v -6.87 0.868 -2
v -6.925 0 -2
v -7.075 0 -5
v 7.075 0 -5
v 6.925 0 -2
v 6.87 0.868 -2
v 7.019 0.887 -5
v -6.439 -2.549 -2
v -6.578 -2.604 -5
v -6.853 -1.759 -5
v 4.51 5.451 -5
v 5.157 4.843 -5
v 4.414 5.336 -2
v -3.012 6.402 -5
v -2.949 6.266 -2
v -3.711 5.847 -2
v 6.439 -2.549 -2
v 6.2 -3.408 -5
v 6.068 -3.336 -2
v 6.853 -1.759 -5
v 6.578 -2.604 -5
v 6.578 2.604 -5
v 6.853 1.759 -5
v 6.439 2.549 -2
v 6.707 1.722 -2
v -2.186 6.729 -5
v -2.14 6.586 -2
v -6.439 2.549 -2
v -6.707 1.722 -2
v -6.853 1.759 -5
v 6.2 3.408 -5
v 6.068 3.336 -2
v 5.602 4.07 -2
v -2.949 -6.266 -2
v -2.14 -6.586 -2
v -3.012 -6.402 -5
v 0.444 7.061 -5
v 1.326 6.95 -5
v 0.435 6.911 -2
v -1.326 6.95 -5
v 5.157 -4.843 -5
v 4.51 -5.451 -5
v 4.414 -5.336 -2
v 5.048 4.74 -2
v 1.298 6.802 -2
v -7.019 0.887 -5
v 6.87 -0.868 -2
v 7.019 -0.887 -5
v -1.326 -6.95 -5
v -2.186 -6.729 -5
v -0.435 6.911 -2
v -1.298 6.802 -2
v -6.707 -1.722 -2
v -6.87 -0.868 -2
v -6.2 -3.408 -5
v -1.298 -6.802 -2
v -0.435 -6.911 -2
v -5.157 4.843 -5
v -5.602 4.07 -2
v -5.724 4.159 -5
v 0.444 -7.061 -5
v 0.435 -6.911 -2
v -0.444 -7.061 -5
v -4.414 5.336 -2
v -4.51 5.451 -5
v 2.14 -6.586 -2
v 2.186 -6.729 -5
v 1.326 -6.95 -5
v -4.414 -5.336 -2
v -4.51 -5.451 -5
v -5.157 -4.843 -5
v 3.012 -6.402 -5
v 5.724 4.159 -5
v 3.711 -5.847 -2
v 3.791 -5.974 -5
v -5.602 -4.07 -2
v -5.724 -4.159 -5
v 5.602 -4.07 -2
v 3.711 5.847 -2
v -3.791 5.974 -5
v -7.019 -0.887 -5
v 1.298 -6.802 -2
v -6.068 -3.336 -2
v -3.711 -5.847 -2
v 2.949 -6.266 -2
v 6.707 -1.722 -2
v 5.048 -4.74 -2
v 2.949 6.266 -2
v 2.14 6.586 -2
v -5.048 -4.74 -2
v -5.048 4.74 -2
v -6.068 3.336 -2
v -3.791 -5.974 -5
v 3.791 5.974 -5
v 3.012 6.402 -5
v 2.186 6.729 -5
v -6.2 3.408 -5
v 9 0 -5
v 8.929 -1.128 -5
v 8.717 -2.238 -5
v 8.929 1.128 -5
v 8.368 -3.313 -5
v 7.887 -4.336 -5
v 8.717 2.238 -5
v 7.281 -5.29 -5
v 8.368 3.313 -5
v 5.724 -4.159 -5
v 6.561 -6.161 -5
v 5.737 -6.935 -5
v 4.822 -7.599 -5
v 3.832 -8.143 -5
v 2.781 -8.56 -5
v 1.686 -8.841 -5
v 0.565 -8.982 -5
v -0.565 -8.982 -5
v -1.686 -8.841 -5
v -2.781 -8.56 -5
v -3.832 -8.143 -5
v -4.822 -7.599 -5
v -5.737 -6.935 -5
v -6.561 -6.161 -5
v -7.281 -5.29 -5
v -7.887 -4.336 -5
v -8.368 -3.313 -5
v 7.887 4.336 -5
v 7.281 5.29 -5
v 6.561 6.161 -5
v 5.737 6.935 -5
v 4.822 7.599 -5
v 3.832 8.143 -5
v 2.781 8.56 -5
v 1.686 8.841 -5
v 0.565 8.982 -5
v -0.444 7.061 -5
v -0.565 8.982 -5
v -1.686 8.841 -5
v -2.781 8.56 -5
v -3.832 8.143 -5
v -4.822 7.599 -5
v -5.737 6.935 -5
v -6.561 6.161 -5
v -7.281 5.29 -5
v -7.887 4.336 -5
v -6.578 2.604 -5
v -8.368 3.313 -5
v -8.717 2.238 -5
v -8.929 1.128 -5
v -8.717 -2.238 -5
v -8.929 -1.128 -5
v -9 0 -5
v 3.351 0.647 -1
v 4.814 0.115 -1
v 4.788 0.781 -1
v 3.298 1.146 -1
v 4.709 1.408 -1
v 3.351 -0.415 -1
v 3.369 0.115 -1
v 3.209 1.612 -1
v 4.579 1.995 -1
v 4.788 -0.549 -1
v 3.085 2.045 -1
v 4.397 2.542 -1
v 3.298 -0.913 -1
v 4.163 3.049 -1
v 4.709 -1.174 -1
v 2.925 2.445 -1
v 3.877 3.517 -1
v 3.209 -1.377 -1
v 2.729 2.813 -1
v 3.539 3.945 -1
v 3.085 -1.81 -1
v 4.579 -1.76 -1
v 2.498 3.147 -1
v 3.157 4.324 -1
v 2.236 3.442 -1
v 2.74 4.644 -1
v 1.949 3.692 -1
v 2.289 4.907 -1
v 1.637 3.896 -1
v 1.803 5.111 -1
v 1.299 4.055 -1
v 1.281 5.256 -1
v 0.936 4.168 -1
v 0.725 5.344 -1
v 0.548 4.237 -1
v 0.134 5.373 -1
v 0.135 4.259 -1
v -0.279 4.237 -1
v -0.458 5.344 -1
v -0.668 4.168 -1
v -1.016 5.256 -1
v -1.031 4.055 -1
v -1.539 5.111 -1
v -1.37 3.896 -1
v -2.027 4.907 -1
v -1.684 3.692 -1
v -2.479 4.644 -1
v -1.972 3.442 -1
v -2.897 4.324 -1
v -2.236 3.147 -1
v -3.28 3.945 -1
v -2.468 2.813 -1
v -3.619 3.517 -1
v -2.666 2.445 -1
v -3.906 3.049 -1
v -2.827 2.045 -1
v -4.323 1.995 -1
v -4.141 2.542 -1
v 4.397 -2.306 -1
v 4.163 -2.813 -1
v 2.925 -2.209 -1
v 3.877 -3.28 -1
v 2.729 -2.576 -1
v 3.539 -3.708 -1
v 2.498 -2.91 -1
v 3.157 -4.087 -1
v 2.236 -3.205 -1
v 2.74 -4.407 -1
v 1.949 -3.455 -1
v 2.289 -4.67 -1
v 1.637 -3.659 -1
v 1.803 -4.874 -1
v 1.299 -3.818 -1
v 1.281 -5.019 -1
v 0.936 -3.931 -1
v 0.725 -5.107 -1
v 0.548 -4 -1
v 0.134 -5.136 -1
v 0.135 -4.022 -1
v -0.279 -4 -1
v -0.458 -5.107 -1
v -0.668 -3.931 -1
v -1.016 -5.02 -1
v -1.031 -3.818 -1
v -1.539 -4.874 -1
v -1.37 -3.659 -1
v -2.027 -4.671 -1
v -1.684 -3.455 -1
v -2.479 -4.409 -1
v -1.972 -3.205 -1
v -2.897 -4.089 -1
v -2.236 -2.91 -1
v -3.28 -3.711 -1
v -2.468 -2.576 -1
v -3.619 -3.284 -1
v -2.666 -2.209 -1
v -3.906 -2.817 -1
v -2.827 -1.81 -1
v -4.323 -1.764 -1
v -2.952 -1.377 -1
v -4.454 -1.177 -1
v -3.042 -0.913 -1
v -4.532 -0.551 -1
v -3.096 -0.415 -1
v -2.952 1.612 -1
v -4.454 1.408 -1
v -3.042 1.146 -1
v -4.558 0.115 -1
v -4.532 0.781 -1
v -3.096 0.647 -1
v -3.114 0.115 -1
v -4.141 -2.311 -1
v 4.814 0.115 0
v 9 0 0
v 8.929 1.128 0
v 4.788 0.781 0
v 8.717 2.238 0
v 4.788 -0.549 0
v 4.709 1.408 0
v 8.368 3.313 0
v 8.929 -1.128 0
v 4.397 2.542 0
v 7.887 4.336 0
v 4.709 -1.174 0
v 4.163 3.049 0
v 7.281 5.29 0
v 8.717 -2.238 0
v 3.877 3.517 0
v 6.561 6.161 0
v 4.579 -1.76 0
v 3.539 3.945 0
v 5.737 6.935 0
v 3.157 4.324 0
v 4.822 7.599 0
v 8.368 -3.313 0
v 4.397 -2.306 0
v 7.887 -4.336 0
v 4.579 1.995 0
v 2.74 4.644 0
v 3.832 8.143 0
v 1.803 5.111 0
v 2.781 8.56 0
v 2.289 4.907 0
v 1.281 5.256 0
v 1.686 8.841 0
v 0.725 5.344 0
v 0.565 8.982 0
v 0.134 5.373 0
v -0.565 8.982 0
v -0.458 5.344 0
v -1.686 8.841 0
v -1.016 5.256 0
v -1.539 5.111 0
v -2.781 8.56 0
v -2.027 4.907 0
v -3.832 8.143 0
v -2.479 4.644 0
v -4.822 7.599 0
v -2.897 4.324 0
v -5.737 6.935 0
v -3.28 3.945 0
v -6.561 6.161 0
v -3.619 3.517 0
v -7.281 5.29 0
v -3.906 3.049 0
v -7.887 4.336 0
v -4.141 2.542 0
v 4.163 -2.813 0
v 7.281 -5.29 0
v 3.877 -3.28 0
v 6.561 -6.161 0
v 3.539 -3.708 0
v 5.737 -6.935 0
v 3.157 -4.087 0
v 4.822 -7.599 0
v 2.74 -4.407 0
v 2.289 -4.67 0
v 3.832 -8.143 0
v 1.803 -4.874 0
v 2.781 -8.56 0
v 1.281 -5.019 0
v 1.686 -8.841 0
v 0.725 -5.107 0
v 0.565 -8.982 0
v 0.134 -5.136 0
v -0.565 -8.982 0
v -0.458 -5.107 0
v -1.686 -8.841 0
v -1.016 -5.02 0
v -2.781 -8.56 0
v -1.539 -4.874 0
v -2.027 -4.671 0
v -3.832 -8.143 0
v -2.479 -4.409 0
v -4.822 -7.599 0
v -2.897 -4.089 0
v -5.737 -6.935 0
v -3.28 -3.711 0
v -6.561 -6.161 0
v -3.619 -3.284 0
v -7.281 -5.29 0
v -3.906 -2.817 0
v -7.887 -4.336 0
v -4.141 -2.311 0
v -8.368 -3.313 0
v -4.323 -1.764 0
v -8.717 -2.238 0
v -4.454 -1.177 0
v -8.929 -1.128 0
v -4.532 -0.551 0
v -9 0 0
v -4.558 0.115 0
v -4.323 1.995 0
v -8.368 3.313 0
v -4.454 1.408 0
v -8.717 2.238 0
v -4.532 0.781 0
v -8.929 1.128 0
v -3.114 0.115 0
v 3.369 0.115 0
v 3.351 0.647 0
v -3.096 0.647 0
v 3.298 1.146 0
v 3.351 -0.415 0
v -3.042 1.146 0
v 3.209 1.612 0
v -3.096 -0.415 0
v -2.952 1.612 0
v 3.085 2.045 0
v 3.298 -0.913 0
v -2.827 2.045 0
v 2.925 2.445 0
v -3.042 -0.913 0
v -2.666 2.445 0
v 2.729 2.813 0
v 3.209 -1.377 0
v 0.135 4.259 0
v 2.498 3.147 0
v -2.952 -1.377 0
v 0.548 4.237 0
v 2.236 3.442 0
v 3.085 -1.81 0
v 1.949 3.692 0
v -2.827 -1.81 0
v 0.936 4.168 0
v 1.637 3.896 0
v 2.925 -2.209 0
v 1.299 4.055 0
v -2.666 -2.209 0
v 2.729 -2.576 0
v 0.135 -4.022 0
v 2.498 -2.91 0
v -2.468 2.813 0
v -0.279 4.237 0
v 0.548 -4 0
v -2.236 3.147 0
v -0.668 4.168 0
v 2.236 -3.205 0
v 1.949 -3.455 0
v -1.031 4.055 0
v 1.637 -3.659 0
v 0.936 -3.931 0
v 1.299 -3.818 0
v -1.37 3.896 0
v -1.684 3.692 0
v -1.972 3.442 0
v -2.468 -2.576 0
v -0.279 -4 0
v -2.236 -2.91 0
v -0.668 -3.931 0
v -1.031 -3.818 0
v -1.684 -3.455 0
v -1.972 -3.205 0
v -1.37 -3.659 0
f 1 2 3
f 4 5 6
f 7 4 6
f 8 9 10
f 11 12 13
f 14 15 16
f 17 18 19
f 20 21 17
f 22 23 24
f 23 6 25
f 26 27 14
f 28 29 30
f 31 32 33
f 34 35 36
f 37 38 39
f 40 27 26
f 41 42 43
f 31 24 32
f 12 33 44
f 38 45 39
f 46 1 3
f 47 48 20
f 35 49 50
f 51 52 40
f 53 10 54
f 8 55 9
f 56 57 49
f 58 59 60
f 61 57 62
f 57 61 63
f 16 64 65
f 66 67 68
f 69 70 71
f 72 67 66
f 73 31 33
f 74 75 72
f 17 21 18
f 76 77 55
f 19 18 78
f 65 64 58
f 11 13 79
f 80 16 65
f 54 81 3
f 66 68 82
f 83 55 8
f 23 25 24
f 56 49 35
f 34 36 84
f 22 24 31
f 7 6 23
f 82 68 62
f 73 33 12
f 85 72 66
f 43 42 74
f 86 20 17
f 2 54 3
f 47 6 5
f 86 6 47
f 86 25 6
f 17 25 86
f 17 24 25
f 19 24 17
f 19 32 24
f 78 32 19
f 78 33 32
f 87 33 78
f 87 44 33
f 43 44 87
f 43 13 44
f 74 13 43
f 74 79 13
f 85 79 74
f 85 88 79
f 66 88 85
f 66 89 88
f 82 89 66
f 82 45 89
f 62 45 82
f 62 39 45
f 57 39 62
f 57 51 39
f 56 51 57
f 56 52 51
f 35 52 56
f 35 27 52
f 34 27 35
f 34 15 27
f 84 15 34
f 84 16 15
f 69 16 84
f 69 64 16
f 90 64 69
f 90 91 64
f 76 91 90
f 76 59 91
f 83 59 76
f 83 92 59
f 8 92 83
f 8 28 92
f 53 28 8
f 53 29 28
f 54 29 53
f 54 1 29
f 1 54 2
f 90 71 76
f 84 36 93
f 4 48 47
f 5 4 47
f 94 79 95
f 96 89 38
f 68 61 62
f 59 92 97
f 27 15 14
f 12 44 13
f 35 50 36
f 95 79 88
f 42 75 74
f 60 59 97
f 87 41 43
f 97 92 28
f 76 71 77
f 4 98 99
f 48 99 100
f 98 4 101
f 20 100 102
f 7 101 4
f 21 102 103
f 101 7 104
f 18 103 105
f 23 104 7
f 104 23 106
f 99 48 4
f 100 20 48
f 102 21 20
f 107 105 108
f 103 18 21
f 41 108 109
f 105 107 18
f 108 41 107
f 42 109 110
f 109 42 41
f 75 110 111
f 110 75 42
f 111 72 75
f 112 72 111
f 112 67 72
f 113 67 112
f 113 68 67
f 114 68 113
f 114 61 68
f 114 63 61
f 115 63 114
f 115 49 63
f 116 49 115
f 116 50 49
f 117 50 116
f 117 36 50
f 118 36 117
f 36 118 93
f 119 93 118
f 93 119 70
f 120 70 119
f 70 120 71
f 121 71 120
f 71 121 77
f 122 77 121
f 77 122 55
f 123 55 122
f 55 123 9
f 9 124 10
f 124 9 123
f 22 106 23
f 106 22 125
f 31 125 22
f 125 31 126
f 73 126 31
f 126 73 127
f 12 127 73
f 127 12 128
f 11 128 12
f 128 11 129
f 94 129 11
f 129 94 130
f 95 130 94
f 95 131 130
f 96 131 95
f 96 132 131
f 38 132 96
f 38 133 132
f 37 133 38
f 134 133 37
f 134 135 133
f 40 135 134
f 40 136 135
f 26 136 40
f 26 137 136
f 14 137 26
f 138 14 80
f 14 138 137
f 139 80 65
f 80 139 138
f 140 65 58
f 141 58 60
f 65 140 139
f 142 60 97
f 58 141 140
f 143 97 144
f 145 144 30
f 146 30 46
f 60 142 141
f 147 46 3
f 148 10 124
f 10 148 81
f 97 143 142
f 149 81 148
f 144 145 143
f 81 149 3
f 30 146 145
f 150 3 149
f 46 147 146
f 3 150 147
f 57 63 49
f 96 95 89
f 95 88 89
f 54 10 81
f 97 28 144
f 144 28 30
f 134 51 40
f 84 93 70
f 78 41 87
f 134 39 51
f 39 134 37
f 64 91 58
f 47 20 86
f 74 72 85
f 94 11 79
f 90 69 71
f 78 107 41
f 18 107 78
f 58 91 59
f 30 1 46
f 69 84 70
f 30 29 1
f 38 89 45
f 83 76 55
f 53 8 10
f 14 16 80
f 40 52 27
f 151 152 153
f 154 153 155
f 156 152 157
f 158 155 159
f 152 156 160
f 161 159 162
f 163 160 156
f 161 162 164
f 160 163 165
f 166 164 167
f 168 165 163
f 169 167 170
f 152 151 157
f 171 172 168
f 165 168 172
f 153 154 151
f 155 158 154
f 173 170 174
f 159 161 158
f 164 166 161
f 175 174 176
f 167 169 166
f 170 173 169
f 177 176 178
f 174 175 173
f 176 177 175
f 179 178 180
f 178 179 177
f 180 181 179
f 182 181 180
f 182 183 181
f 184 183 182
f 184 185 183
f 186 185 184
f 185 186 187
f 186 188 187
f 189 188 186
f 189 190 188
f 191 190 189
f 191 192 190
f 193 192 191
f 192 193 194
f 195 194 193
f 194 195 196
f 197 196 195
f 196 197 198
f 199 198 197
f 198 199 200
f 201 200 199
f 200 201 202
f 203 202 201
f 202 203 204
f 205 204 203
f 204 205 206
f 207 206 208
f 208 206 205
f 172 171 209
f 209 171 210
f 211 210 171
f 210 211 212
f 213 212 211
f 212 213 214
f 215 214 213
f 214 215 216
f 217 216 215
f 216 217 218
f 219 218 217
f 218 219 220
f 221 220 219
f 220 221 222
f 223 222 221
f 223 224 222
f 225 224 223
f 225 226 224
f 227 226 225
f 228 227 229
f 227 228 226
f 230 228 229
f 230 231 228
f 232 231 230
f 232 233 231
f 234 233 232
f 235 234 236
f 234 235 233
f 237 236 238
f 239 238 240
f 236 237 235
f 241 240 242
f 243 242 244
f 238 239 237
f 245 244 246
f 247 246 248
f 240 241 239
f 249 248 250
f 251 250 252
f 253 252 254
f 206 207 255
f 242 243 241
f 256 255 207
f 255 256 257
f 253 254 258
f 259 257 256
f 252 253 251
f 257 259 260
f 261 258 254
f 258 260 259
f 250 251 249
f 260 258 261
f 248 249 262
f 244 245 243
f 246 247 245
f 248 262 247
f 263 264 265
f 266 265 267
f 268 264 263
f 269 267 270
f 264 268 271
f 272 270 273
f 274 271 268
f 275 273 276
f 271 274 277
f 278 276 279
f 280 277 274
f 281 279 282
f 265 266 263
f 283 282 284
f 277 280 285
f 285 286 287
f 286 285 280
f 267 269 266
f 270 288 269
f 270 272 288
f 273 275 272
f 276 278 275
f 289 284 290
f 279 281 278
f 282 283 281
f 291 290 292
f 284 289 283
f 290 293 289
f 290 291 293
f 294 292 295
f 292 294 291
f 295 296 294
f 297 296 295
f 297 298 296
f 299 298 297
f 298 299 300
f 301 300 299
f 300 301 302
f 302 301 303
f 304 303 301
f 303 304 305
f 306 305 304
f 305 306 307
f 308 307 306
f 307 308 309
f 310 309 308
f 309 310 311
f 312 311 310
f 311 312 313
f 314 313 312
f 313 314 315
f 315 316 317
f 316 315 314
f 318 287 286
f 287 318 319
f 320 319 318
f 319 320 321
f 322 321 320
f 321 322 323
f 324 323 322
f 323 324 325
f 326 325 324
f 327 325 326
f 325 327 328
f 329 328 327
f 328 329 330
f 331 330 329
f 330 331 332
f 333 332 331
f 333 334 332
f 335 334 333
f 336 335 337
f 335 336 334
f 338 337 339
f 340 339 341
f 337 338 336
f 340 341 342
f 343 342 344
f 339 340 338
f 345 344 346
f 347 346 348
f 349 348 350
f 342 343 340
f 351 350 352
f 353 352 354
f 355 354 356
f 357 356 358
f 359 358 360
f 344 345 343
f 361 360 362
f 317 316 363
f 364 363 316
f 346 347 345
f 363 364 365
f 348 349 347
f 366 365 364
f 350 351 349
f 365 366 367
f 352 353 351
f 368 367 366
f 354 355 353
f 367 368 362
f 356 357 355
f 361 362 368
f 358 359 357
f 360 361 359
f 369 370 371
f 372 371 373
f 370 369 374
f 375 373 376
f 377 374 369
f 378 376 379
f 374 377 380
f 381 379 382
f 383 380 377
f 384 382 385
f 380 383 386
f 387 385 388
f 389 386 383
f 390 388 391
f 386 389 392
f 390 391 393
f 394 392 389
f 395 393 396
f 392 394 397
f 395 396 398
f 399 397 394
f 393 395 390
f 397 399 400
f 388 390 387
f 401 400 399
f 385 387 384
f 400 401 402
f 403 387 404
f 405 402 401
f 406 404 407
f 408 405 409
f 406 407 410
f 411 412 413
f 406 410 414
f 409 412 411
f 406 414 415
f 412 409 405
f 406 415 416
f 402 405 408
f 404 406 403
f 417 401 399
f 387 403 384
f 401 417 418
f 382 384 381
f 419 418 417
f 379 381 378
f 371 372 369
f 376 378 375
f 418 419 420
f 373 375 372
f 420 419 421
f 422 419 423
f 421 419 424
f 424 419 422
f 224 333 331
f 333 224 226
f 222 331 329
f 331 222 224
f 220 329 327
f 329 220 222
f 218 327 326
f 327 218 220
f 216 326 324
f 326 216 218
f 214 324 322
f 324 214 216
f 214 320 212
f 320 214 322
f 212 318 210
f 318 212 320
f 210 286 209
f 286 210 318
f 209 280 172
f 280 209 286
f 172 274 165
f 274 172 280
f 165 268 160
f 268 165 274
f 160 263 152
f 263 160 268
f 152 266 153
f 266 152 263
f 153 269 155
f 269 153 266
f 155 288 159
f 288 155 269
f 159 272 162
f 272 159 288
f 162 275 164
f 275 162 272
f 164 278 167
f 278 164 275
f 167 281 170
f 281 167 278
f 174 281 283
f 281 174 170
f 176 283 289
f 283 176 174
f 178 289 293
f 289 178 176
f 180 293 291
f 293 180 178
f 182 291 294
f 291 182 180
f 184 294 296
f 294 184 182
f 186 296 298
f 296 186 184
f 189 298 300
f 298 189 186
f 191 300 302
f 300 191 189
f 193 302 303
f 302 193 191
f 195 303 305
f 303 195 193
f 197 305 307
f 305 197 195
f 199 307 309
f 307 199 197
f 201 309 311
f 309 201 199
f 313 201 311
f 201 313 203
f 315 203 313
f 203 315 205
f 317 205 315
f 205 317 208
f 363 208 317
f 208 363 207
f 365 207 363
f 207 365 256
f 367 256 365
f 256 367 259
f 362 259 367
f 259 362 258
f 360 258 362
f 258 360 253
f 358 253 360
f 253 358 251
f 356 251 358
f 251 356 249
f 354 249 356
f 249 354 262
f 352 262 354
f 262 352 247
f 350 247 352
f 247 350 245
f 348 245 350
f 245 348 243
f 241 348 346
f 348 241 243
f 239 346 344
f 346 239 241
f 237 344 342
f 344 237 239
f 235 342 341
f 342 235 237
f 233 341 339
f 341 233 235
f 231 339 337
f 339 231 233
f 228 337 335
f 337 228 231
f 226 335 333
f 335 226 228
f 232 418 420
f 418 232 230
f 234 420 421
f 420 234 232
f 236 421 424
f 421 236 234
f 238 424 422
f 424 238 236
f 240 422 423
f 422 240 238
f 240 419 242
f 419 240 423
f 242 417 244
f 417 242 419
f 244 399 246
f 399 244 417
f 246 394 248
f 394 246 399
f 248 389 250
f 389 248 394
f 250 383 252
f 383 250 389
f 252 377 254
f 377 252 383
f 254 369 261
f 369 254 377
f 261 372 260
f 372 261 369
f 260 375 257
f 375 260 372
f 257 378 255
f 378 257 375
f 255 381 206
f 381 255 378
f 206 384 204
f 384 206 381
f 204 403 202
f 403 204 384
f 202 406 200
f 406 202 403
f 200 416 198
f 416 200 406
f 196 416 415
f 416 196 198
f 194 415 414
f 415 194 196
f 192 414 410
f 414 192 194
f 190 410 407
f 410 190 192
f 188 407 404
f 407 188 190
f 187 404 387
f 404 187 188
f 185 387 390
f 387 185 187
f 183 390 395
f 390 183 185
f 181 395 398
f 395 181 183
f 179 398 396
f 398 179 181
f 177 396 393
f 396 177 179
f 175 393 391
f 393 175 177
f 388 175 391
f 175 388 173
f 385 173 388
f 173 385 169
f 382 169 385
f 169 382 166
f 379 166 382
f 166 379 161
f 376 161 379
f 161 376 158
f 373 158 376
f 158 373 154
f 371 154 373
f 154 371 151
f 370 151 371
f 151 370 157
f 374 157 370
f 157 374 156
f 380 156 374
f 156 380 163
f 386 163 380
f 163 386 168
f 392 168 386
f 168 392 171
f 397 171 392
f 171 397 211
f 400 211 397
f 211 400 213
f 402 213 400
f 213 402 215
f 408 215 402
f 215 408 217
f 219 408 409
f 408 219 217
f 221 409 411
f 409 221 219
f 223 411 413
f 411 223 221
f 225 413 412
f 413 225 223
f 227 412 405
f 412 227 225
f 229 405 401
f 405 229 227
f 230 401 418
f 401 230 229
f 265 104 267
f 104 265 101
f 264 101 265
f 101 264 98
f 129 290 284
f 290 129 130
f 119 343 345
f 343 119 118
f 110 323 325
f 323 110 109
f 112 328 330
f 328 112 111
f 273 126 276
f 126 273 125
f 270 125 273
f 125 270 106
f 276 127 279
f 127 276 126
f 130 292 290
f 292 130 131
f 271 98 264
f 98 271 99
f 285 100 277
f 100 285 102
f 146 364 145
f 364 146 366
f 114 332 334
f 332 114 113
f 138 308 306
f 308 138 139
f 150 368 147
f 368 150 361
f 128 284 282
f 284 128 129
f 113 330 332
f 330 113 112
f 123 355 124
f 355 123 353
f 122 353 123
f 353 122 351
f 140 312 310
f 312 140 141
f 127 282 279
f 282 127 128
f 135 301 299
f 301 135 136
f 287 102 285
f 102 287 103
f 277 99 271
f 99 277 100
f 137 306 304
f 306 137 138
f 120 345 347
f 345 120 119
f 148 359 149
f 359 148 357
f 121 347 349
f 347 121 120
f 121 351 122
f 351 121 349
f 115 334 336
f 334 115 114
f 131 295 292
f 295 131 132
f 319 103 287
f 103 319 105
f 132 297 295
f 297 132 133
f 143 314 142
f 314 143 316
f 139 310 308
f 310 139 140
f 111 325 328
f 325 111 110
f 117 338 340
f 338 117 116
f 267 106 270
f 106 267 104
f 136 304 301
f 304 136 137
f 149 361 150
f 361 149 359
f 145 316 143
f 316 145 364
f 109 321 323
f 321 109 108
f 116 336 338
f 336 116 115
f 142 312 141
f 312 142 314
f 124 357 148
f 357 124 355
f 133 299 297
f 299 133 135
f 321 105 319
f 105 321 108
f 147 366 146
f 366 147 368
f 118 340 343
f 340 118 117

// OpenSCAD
$fn = 50;

difference() {
	union() {
		translate(v = [0, 0, -5.0]) {
			cylinder(h = 5, r = 9.0);
		}
	}
	union() {
		#translate(v = [0, 0, -5.0]) {
			cylinder(h = 3, r1 = 7.075, r2 = 6.925);
		}
		translate(v = [0, 0, -1]) {
			linear_extrude(height = 1) {
				text(font = "Impact", halign = "center", size = 10, text = "O", valign = "center");
			}
		}
	}
}
